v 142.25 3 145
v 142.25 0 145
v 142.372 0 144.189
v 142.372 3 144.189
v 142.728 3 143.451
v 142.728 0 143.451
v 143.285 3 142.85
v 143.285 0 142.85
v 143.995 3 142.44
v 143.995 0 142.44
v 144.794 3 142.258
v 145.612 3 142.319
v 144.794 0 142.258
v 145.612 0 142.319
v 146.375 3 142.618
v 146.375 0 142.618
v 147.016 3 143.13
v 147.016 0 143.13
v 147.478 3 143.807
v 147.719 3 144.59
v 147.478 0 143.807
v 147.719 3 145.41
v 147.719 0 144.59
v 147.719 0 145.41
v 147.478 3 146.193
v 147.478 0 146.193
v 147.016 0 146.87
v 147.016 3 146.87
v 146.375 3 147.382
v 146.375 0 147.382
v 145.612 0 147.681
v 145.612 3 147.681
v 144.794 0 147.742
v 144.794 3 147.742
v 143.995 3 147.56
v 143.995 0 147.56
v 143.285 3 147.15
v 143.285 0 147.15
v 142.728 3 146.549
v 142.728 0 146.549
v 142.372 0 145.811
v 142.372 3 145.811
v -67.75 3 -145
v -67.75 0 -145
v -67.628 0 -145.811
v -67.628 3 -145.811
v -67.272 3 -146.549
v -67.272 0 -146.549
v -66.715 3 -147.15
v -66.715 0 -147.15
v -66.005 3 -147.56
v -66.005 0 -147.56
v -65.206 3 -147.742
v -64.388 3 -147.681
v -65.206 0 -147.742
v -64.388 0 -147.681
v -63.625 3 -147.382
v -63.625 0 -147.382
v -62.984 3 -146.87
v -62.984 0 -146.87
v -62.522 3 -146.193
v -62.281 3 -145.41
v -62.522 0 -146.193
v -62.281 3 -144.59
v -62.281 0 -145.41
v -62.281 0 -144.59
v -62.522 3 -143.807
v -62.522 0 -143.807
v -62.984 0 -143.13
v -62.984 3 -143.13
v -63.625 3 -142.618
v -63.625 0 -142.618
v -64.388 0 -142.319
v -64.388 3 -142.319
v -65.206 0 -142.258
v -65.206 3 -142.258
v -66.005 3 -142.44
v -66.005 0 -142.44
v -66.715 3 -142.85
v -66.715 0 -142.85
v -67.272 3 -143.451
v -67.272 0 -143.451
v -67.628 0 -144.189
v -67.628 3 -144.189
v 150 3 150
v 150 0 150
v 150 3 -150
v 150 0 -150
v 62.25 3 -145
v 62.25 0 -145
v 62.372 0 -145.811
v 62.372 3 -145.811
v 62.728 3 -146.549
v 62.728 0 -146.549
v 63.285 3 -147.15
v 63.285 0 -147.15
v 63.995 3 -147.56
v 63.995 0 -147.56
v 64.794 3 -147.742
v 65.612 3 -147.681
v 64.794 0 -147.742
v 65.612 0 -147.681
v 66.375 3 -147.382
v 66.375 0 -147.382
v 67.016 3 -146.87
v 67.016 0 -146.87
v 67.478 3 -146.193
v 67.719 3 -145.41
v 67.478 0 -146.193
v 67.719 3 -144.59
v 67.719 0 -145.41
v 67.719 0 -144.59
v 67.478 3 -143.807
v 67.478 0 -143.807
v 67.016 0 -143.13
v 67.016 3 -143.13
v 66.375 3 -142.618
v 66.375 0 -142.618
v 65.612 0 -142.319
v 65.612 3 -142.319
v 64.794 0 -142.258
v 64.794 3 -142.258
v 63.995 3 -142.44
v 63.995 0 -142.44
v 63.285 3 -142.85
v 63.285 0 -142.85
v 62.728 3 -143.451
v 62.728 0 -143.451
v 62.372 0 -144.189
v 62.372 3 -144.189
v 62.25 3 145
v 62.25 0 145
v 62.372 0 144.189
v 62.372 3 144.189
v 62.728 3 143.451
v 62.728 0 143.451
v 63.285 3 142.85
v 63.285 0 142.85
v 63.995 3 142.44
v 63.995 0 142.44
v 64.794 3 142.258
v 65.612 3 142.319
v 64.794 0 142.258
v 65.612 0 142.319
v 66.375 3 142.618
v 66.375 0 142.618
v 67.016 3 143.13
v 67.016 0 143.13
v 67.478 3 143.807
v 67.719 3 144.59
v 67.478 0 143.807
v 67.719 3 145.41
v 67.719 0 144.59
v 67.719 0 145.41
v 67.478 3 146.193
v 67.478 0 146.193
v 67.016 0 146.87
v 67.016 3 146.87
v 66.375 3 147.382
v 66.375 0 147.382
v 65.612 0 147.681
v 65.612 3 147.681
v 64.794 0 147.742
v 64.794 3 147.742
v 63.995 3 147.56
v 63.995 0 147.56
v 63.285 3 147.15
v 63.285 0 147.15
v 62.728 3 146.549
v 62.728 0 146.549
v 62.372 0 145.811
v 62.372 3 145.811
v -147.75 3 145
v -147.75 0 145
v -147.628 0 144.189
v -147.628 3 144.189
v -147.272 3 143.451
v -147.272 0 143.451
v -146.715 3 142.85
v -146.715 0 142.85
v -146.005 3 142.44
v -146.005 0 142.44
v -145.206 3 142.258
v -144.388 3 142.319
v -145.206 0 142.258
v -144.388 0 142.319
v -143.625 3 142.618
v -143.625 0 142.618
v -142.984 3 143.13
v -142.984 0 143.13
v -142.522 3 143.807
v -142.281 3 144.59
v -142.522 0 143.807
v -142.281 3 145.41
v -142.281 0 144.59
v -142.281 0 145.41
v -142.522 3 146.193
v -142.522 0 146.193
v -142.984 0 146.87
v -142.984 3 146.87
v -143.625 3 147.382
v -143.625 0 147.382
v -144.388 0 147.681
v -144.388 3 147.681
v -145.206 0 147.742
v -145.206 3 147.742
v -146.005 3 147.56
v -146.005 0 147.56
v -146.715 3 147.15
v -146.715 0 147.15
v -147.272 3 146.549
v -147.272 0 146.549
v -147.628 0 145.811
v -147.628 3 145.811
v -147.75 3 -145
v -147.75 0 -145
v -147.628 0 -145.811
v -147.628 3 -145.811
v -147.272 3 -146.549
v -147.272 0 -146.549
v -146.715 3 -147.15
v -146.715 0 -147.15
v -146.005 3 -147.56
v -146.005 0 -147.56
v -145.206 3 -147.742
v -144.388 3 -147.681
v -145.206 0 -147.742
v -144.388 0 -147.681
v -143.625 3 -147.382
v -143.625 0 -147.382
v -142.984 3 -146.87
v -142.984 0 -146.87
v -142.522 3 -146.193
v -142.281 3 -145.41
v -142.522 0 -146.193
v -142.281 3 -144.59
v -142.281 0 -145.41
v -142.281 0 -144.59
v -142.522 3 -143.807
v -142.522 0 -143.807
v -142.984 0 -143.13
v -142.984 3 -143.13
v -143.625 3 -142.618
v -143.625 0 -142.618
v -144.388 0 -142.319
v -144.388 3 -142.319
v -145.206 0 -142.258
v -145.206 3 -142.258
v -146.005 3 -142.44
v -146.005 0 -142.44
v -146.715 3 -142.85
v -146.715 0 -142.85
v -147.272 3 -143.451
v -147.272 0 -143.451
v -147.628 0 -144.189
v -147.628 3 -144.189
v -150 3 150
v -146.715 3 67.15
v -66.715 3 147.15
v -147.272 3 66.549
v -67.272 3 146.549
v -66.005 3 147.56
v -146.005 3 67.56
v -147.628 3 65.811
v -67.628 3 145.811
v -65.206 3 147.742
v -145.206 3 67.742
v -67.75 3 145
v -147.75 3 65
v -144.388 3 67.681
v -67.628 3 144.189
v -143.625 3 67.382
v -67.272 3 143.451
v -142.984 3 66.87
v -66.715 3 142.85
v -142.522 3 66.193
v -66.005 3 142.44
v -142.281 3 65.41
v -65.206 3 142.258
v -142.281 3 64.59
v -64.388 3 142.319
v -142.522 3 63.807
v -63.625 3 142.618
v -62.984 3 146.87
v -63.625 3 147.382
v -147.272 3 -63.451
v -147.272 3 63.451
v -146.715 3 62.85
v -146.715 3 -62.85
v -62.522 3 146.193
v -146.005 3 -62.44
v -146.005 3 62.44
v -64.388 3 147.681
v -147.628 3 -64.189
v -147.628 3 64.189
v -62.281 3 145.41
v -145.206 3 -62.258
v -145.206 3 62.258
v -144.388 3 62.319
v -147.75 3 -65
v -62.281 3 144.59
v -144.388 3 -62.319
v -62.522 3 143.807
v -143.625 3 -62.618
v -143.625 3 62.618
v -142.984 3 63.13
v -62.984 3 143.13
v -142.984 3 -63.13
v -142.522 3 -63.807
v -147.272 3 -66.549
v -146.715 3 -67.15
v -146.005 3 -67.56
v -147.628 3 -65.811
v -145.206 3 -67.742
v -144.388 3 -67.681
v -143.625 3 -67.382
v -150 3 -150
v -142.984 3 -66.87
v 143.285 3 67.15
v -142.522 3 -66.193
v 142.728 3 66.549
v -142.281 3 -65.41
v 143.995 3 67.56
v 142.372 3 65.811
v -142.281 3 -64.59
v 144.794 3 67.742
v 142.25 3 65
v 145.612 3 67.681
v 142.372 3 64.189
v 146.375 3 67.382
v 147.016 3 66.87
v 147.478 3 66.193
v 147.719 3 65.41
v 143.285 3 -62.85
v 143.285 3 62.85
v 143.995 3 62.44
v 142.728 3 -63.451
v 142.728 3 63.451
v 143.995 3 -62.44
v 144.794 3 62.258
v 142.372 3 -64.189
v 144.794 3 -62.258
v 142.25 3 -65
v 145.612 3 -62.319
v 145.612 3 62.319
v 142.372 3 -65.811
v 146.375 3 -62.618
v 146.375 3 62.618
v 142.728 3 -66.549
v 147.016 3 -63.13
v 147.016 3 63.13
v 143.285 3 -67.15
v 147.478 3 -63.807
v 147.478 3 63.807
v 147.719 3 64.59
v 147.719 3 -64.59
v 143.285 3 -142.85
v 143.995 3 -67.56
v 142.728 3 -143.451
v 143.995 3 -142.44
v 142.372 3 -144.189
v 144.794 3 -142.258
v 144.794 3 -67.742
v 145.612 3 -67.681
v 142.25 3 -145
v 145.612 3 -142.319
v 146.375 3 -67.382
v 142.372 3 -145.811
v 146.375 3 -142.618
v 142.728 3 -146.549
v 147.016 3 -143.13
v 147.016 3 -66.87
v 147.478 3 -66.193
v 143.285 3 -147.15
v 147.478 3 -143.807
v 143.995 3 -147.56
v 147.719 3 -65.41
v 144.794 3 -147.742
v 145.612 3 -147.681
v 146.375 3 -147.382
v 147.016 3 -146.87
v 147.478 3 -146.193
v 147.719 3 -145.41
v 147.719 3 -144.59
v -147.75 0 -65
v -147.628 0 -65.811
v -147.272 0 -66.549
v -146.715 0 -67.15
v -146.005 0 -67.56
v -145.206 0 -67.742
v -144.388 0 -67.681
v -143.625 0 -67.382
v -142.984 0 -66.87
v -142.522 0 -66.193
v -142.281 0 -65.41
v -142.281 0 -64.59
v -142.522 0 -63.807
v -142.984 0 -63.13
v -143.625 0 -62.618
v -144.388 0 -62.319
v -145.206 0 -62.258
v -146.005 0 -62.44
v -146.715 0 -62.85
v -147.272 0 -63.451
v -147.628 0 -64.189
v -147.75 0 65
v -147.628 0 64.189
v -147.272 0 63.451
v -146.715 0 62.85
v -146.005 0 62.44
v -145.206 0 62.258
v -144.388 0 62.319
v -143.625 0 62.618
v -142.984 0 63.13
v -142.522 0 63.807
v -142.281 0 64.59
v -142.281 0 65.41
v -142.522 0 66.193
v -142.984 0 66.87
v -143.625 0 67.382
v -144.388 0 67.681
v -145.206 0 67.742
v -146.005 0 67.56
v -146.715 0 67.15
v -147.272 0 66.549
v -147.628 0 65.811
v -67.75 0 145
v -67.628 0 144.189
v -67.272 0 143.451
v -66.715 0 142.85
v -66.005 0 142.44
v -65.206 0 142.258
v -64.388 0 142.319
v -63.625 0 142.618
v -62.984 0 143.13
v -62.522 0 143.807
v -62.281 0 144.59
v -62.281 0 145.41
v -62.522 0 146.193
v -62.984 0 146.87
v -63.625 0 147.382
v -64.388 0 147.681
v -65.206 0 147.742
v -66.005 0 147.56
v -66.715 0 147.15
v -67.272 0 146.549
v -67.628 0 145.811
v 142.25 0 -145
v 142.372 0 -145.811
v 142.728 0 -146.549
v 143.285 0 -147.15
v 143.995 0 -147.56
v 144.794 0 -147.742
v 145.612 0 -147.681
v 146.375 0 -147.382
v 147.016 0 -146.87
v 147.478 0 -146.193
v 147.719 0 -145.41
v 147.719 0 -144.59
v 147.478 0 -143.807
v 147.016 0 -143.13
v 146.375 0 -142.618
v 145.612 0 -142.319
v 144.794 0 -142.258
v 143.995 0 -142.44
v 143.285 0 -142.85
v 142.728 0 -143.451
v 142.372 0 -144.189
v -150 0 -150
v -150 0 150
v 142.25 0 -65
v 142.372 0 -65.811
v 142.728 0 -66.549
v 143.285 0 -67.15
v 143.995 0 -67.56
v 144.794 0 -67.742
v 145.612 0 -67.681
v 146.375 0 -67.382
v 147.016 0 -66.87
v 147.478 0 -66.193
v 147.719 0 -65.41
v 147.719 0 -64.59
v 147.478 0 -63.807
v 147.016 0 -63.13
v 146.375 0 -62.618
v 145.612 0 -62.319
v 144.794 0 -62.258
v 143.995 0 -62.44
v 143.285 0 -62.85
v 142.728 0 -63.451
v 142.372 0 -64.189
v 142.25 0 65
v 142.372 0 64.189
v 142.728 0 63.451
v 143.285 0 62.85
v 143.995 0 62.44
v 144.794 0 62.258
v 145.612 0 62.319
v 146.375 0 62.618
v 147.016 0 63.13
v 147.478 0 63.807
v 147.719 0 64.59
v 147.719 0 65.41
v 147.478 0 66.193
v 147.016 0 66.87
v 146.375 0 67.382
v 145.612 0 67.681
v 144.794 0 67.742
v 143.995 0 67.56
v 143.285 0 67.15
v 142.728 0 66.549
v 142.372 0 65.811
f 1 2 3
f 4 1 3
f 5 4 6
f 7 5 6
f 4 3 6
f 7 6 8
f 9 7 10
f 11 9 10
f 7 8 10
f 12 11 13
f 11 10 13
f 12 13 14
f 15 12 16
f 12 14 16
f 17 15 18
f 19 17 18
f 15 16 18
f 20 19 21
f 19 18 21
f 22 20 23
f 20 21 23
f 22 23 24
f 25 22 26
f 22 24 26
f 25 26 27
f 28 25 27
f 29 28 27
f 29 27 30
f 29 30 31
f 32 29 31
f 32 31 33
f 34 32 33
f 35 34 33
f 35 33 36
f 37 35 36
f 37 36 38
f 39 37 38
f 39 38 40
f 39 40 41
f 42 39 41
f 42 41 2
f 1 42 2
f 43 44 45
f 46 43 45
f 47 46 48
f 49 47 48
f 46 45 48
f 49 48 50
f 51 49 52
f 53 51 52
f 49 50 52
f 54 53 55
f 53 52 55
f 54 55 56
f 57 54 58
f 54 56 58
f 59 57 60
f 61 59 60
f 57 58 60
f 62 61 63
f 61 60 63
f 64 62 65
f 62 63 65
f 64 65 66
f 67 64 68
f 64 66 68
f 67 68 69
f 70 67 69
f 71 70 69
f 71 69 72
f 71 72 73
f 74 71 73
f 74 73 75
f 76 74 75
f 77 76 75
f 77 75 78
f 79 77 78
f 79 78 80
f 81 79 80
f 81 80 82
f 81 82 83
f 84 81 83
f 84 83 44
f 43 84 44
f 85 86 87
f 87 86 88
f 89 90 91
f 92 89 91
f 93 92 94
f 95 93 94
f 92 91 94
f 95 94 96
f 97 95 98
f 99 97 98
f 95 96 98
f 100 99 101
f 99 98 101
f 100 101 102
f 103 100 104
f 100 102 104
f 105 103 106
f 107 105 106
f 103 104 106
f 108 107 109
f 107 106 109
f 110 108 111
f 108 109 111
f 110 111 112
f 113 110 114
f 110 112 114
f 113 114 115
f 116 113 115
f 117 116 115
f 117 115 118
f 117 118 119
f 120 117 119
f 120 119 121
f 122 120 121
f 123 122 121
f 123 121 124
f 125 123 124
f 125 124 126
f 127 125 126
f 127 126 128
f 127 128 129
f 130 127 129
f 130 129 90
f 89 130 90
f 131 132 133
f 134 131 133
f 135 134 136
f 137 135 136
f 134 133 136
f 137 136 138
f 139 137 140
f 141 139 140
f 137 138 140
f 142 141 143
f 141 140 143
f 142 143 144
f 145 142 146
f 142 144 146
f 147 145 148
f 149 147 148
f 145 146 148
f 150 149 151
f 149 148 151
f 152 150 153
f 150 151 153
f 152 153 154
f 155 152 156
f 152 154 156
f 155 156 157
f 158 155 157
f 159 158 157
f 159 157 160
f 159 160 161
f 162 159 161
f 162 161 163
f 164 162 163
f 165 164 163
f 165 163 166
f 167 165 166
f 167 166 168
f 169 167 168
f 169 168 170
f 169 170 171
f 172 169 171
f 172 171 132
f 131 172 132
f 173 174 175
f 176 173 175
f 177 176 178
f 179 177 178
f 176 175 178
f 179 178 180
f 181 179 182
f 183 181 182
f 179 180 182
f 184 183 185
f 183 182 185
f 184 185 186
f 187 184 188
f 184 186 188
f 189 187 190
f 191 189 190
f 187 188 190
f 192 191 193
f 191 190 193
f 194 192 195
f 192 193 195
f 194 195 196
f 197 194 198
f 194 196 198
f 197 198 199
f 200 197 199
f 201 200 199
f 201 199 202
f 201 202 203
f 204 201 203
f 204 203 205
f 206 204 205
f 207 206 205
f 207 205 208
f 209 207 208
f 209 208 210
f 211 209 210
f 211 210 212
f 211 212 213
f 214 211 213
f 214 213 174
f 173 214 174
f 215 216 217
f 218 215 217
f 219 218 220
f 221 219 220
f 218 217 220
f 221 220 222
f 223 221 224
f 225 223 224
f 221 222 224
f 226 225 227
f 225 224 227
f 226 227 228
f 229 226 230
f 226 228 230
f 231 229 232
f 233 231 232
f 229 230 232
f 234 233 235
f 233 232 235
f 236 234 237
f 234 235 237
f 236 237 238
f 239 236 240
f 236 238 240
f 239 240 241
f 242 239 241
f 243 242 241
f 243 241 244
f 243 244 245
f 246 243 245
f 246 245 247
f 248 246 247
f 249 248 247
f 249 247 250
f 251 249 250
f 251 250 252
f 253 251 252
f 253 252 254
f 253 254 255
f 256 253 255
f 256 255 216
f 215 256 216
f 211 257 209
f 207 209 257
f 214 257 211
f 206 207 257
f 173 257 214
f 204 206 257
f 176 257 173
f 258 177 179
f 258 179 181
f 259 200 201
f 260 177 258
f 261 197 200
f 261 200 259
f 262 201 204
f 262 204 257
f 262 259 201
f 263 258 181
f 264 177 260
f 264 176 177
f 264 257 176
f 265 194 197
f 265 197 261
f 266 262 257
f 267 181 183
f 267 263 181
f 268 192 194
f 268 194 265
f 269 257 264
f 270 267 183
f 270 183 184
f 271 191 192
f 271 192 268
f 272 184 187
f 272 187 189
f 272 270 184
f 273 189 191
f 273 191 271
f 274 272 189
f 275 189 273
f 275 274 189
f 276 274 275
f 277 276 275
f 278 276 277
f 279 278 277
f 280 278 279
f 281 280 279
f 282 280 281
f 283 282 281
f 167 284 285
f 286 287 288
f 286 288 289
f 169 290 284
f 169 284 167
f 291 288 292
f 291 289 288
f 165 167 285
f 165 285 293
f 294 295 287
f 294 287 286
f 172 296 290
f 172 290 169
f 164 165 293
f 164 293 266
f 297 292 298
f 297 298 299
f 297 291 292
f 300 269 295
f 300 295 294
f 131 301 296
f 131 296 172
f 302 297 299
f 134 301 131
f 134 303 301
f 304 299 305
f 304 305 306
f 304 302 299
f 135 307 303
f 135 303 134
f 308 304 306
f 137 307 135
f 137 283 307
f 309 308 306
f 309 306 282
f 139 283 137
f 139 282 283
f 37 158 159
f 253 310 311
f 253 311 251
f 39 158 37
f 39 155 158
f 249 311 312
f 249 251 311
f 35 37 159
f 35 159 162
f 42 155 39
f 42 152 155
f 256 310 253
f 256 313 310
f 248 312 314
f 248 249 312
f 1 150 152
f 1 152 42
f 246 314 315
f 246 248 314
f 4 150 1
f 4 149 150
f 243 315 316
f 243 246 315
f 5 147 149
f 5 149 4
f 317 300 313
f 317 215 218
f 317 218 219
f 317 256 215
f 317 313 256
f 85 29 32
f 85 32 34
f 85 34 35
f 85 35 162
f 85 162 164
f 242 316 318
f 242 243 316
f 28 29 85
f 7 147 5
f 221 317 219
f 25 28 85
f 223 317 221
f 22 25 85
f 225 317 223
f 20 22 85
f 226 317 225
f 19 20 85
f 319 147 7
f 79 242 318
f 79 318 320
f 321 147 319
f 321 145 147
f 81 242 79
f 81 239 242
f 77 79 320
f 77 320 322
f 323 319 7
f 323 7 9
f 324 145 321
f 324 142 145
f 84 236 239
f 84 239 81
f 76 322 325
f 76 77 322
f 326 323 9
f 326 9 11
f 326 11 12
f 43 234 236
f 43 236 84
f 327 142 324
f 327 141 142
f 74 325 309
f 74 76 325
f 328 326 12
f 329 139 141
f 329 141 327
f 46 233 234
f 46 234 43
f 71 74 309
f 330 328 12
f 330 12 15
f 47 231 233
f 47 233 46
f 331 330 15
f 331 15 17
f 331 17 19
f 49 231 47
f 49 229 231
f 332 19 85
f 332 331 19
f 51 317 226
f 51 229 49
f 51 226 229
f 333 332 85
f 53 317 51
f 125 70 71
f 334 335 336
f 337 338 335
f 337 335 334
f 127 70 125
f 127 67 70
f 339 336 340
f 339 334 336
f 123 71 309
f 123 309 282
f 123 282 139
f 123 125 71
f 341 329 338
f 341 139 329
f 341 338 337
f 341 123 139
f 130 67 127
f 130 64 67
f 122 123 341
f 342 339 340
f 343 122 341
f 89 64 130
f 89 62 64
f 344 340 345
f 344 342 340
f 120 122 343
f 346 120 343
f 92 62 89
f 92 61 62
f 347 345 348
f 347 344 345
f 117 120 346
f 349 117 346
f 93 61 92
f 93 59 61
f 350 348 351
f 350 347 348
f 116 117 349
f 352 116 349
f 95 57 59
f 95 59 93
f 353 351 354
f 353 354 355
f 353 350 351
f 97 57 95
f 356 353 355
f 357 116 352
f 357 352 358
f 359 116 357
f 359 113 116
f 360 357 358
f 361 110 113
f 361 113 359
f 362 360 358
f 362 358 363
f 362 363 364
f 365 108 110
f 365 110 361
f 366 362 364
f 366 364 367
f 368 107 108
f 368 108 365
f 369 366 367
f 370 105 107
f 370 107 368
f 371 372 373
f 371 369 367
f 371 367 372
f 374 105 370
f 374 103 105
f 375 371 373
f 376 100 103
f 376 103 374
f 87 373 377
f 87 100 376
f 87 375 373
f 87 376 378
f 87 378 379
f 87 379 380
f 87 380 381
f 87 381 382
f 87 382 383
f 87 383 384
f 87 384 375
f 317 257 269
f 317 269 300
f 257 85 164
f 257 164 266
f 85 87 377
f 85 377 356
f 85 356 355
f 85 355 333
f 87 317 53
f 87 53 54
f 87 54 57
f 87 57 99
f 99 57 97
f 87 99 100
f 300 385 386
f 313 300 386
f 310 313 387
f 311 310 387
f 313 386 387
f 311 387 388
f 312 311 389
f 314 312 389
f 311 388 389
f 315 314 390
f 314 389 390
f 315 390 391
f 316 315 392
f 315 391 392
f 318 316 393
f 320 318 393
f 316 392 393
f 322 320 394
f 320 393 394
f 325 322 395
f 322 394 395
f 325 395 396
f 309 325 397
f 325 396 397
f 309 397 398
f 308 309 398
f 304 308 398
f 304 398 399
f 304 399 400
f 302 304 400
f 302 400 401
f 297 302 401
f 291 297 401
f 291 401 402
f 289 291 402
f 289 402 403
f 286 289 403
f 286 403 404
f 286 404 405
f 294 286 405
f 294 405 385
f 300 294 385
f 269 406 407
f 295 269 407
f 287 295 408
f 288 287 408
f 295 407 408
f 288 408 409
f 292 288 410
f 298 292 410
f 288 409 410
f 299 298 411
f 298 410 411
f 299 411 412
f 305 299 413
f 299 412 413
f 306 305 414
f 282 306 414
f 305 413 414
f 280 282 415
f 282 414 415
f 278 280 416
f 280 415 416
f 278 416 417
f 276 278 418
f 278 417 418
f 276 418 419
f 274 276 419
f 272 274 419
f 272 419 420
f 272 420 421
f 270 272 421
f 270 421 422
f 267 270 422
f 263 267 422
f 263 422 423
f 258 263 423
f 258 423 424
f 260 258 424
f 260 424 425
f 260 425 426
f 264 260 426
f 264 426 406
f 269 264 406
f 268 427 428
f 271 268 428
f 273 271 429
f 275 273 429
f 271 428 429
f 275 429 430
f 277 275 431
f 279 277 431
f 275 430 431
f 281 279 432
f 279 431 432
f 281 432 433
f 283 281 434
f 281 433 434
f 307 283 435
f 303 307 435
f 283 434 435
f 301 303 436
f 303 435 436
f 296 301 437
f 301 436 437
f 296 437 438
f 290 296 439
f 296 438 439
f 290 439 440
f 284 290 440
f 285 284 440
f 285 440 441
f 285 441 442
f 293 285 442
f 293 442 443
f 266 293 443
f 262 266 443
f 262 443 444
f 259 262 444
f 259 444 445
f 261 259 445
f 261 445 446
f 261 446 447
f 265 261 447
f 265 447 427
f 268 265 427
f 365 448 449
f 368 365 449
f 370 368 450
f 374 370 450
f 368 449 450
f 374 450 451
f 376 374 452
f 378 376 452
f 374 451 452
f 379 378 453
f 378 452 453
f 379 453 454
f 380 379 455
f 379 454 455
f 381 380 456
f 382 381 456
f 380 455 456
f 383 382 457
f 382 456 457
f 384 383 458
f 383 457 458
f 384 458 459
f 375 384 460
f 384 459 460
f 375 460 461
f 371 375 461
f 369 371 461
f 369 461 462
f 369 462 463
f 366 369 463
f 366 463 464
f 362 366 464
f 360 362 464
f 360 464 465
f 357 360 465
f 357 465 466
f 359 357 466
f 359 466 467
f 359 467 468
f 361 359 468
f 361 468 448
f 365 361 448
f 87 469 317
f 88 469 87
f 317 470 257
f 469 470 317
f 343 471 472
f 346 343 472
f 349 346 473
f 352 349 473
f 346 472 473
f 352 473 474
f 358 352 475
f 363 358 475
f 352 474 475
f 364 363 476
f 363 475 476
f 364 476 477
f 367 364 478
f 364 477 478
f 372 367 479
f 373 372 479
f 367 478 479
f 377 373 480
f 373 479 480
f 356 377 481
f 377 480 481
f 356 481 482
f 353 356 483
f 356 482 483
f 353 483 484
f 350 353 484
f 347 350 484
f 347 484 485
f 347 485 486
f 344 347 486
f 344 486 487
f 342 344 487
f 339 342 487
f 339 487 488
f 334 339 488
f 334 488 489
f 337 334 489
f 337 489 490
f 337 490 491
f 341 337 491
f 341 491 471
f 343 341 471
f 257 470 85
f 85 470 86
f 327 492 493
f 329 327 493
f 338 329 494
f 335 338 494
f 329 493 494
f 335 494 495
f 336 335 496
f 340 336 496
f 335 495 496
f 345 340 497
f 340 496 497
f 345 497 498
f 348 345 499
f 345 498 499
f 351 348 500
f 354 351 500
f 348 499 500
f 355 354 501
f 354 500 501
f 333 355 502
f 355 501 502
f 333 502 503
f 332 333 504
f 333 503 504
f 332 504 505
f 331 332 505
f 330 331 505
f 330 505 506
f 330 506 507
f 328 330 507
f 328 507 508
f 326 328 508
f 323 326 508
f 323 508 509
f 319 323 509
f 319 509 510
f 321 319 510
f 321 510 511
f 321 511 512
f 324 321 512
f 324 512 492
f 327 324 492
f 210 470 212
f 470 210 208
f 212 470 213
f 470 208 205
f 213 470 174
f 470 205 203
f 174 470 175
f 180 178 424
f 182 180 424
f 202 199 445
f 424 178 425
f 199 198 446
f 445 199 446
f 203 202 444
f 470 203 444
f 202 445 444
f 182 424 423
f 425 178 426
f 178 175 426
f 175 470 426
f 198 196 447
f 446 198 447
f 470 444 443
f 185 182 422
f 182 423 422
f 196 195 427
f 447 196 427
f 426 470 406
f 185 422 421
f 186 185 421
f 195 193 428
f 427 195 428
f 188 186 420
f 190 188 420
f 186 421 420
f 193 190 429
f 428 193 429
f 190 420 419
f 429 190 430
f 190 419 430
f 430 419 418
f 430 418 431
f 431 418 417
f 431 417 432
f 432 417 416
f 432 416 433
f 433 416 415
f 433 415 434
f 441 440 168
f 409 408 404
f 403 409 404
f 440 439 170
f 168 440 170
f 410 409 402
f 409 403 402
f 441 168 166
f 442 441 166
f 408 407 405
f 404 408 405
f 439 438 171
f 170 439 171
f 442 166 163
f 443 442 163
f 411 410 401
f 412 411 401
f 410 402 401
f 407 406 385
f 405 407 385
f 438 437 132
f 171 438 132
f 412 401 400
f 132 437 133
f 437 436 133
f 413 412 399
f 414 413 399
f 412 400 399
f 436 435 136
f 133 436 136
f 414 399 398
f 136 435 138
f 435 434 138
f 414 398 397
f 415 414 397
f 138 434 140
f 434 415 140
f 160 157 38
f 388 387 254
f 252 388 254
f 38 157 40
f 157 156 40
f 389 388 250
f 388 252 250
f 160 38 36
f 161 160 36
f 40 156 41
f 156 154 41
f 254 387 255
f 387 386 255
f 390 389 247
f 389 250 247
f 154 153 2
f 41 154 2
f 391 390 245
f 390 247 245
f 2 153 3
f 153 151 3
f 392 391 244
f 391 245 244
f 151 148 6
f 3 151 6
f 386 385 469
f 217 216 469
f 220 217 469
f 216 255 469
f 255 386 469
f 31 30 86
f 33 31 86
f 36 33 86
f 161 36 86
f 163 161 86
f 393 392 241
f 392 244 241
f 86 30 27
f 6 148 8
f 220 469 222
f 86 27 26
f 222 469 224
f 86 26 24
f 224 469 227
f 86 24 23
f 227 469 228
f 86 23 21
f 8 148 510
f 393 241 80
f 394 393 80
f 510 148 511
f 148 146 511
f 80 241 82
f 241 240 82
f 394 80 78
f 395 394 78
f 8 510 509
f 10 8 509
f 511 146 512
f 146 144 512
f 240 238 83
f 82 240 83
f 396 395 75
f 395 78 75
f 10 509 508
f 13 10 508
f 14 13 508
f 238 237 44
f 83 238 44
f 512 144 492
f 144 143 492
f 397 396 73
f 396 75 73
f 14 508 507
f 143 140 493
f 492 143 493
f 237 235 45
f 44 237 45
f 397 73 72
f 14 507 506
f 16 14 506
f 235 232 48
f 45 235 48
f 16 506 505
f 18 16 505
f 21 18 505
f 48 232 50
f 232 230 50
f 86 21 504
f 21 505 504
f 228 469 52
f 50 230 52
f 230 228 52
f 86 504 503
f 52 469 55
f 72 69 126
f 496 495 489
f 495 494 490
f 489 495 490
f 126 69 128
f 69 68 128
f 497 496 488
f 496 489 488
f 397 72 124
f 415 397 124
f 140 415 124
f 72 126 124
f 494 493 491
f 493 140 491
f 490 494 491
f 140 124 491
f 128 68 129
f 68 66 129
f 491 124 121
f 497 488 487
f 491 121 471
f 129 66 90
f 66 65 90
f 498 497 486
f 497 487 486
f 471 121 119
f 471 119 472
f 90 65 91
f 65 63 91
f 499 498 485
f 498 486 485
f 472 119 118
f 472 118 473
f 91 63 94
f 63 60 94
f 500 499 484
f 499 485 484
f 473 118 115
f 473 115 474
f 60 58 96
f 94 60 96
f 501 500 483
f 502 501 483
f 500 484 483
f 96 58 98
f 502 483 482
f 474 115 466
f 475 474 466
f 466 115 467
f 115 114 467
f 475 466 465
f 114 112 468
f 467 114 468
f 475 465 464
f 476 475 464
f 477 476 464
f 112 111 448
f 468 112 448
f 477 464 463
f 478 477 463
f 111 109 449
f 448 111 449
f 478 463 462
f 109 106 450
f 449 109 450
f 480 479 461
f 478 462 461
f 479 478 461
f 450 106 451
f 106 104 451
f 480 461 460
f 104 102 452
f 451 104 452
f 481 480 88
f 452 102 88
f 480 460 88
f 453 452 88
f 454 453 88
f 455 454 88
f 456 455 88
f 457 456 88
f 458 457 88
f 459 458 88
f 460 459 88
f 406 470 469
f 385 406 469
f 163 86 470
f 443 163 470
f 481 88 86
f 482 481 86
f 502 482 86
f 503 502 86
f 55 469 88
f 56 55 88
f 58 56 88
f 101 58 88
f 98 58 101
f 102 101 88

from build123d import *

# Parameters (mm, degrees)
SKETCH1_W                = 300
SKETCH1_H                = 300
BOSS_EXTRUDE1_DEPTH      = 3
M5_CLEARANCE_HOLE1_D     = 5.5
M5_CLEARANCE_HOLE1_DEPTH = 10
M5_CLEARANCE_HOLE1_TIP   = 1.652366702


with BuildPart() as part:
    # Sketch1 → Boss-Extrude1 (new body)
    with BuildSketch(Plane(origin=(0, 0, 0), x_dir=(1, 0, 0), z_dir=(0, 1, 0))):
        Rectangle(SKETCH1_W, SKETCH1_H)
    extrude(amount=BOSS_EXTRUDE1_DEPTH)

    # M5 Clearance Hole1
    with Locations(Plane(origin=(0, 3, 0), x_dir=(1, 0, 0), z_dir=(0, 1, 0))):
        with Locations((-145, 145), (145, -145), (-145, -145), (145, 145), (-65, 145), (65, 145), (65, -145), (-65, -145), (-145, 65), (-145, -65), (145, 65), (145, -65)):
            Hole(M5_CLEARANCE_HOLE1_D / 2, depth=M5_CLEARANCE_HOLE1_DEPTH)
            with Locations((0, 0, -(M5_CLEARANCE_HOLE1_DEPTH + M5_CLEARANCE_HOLE1_TIP / 2))):  # 118° drill point
                Cone(0, M5_CLEARANCE_HOLE1_D / 2, M5_CLEARANCE_HOLE1_TIP, mode=Mode.SUBTRACT)


solid = part.part
